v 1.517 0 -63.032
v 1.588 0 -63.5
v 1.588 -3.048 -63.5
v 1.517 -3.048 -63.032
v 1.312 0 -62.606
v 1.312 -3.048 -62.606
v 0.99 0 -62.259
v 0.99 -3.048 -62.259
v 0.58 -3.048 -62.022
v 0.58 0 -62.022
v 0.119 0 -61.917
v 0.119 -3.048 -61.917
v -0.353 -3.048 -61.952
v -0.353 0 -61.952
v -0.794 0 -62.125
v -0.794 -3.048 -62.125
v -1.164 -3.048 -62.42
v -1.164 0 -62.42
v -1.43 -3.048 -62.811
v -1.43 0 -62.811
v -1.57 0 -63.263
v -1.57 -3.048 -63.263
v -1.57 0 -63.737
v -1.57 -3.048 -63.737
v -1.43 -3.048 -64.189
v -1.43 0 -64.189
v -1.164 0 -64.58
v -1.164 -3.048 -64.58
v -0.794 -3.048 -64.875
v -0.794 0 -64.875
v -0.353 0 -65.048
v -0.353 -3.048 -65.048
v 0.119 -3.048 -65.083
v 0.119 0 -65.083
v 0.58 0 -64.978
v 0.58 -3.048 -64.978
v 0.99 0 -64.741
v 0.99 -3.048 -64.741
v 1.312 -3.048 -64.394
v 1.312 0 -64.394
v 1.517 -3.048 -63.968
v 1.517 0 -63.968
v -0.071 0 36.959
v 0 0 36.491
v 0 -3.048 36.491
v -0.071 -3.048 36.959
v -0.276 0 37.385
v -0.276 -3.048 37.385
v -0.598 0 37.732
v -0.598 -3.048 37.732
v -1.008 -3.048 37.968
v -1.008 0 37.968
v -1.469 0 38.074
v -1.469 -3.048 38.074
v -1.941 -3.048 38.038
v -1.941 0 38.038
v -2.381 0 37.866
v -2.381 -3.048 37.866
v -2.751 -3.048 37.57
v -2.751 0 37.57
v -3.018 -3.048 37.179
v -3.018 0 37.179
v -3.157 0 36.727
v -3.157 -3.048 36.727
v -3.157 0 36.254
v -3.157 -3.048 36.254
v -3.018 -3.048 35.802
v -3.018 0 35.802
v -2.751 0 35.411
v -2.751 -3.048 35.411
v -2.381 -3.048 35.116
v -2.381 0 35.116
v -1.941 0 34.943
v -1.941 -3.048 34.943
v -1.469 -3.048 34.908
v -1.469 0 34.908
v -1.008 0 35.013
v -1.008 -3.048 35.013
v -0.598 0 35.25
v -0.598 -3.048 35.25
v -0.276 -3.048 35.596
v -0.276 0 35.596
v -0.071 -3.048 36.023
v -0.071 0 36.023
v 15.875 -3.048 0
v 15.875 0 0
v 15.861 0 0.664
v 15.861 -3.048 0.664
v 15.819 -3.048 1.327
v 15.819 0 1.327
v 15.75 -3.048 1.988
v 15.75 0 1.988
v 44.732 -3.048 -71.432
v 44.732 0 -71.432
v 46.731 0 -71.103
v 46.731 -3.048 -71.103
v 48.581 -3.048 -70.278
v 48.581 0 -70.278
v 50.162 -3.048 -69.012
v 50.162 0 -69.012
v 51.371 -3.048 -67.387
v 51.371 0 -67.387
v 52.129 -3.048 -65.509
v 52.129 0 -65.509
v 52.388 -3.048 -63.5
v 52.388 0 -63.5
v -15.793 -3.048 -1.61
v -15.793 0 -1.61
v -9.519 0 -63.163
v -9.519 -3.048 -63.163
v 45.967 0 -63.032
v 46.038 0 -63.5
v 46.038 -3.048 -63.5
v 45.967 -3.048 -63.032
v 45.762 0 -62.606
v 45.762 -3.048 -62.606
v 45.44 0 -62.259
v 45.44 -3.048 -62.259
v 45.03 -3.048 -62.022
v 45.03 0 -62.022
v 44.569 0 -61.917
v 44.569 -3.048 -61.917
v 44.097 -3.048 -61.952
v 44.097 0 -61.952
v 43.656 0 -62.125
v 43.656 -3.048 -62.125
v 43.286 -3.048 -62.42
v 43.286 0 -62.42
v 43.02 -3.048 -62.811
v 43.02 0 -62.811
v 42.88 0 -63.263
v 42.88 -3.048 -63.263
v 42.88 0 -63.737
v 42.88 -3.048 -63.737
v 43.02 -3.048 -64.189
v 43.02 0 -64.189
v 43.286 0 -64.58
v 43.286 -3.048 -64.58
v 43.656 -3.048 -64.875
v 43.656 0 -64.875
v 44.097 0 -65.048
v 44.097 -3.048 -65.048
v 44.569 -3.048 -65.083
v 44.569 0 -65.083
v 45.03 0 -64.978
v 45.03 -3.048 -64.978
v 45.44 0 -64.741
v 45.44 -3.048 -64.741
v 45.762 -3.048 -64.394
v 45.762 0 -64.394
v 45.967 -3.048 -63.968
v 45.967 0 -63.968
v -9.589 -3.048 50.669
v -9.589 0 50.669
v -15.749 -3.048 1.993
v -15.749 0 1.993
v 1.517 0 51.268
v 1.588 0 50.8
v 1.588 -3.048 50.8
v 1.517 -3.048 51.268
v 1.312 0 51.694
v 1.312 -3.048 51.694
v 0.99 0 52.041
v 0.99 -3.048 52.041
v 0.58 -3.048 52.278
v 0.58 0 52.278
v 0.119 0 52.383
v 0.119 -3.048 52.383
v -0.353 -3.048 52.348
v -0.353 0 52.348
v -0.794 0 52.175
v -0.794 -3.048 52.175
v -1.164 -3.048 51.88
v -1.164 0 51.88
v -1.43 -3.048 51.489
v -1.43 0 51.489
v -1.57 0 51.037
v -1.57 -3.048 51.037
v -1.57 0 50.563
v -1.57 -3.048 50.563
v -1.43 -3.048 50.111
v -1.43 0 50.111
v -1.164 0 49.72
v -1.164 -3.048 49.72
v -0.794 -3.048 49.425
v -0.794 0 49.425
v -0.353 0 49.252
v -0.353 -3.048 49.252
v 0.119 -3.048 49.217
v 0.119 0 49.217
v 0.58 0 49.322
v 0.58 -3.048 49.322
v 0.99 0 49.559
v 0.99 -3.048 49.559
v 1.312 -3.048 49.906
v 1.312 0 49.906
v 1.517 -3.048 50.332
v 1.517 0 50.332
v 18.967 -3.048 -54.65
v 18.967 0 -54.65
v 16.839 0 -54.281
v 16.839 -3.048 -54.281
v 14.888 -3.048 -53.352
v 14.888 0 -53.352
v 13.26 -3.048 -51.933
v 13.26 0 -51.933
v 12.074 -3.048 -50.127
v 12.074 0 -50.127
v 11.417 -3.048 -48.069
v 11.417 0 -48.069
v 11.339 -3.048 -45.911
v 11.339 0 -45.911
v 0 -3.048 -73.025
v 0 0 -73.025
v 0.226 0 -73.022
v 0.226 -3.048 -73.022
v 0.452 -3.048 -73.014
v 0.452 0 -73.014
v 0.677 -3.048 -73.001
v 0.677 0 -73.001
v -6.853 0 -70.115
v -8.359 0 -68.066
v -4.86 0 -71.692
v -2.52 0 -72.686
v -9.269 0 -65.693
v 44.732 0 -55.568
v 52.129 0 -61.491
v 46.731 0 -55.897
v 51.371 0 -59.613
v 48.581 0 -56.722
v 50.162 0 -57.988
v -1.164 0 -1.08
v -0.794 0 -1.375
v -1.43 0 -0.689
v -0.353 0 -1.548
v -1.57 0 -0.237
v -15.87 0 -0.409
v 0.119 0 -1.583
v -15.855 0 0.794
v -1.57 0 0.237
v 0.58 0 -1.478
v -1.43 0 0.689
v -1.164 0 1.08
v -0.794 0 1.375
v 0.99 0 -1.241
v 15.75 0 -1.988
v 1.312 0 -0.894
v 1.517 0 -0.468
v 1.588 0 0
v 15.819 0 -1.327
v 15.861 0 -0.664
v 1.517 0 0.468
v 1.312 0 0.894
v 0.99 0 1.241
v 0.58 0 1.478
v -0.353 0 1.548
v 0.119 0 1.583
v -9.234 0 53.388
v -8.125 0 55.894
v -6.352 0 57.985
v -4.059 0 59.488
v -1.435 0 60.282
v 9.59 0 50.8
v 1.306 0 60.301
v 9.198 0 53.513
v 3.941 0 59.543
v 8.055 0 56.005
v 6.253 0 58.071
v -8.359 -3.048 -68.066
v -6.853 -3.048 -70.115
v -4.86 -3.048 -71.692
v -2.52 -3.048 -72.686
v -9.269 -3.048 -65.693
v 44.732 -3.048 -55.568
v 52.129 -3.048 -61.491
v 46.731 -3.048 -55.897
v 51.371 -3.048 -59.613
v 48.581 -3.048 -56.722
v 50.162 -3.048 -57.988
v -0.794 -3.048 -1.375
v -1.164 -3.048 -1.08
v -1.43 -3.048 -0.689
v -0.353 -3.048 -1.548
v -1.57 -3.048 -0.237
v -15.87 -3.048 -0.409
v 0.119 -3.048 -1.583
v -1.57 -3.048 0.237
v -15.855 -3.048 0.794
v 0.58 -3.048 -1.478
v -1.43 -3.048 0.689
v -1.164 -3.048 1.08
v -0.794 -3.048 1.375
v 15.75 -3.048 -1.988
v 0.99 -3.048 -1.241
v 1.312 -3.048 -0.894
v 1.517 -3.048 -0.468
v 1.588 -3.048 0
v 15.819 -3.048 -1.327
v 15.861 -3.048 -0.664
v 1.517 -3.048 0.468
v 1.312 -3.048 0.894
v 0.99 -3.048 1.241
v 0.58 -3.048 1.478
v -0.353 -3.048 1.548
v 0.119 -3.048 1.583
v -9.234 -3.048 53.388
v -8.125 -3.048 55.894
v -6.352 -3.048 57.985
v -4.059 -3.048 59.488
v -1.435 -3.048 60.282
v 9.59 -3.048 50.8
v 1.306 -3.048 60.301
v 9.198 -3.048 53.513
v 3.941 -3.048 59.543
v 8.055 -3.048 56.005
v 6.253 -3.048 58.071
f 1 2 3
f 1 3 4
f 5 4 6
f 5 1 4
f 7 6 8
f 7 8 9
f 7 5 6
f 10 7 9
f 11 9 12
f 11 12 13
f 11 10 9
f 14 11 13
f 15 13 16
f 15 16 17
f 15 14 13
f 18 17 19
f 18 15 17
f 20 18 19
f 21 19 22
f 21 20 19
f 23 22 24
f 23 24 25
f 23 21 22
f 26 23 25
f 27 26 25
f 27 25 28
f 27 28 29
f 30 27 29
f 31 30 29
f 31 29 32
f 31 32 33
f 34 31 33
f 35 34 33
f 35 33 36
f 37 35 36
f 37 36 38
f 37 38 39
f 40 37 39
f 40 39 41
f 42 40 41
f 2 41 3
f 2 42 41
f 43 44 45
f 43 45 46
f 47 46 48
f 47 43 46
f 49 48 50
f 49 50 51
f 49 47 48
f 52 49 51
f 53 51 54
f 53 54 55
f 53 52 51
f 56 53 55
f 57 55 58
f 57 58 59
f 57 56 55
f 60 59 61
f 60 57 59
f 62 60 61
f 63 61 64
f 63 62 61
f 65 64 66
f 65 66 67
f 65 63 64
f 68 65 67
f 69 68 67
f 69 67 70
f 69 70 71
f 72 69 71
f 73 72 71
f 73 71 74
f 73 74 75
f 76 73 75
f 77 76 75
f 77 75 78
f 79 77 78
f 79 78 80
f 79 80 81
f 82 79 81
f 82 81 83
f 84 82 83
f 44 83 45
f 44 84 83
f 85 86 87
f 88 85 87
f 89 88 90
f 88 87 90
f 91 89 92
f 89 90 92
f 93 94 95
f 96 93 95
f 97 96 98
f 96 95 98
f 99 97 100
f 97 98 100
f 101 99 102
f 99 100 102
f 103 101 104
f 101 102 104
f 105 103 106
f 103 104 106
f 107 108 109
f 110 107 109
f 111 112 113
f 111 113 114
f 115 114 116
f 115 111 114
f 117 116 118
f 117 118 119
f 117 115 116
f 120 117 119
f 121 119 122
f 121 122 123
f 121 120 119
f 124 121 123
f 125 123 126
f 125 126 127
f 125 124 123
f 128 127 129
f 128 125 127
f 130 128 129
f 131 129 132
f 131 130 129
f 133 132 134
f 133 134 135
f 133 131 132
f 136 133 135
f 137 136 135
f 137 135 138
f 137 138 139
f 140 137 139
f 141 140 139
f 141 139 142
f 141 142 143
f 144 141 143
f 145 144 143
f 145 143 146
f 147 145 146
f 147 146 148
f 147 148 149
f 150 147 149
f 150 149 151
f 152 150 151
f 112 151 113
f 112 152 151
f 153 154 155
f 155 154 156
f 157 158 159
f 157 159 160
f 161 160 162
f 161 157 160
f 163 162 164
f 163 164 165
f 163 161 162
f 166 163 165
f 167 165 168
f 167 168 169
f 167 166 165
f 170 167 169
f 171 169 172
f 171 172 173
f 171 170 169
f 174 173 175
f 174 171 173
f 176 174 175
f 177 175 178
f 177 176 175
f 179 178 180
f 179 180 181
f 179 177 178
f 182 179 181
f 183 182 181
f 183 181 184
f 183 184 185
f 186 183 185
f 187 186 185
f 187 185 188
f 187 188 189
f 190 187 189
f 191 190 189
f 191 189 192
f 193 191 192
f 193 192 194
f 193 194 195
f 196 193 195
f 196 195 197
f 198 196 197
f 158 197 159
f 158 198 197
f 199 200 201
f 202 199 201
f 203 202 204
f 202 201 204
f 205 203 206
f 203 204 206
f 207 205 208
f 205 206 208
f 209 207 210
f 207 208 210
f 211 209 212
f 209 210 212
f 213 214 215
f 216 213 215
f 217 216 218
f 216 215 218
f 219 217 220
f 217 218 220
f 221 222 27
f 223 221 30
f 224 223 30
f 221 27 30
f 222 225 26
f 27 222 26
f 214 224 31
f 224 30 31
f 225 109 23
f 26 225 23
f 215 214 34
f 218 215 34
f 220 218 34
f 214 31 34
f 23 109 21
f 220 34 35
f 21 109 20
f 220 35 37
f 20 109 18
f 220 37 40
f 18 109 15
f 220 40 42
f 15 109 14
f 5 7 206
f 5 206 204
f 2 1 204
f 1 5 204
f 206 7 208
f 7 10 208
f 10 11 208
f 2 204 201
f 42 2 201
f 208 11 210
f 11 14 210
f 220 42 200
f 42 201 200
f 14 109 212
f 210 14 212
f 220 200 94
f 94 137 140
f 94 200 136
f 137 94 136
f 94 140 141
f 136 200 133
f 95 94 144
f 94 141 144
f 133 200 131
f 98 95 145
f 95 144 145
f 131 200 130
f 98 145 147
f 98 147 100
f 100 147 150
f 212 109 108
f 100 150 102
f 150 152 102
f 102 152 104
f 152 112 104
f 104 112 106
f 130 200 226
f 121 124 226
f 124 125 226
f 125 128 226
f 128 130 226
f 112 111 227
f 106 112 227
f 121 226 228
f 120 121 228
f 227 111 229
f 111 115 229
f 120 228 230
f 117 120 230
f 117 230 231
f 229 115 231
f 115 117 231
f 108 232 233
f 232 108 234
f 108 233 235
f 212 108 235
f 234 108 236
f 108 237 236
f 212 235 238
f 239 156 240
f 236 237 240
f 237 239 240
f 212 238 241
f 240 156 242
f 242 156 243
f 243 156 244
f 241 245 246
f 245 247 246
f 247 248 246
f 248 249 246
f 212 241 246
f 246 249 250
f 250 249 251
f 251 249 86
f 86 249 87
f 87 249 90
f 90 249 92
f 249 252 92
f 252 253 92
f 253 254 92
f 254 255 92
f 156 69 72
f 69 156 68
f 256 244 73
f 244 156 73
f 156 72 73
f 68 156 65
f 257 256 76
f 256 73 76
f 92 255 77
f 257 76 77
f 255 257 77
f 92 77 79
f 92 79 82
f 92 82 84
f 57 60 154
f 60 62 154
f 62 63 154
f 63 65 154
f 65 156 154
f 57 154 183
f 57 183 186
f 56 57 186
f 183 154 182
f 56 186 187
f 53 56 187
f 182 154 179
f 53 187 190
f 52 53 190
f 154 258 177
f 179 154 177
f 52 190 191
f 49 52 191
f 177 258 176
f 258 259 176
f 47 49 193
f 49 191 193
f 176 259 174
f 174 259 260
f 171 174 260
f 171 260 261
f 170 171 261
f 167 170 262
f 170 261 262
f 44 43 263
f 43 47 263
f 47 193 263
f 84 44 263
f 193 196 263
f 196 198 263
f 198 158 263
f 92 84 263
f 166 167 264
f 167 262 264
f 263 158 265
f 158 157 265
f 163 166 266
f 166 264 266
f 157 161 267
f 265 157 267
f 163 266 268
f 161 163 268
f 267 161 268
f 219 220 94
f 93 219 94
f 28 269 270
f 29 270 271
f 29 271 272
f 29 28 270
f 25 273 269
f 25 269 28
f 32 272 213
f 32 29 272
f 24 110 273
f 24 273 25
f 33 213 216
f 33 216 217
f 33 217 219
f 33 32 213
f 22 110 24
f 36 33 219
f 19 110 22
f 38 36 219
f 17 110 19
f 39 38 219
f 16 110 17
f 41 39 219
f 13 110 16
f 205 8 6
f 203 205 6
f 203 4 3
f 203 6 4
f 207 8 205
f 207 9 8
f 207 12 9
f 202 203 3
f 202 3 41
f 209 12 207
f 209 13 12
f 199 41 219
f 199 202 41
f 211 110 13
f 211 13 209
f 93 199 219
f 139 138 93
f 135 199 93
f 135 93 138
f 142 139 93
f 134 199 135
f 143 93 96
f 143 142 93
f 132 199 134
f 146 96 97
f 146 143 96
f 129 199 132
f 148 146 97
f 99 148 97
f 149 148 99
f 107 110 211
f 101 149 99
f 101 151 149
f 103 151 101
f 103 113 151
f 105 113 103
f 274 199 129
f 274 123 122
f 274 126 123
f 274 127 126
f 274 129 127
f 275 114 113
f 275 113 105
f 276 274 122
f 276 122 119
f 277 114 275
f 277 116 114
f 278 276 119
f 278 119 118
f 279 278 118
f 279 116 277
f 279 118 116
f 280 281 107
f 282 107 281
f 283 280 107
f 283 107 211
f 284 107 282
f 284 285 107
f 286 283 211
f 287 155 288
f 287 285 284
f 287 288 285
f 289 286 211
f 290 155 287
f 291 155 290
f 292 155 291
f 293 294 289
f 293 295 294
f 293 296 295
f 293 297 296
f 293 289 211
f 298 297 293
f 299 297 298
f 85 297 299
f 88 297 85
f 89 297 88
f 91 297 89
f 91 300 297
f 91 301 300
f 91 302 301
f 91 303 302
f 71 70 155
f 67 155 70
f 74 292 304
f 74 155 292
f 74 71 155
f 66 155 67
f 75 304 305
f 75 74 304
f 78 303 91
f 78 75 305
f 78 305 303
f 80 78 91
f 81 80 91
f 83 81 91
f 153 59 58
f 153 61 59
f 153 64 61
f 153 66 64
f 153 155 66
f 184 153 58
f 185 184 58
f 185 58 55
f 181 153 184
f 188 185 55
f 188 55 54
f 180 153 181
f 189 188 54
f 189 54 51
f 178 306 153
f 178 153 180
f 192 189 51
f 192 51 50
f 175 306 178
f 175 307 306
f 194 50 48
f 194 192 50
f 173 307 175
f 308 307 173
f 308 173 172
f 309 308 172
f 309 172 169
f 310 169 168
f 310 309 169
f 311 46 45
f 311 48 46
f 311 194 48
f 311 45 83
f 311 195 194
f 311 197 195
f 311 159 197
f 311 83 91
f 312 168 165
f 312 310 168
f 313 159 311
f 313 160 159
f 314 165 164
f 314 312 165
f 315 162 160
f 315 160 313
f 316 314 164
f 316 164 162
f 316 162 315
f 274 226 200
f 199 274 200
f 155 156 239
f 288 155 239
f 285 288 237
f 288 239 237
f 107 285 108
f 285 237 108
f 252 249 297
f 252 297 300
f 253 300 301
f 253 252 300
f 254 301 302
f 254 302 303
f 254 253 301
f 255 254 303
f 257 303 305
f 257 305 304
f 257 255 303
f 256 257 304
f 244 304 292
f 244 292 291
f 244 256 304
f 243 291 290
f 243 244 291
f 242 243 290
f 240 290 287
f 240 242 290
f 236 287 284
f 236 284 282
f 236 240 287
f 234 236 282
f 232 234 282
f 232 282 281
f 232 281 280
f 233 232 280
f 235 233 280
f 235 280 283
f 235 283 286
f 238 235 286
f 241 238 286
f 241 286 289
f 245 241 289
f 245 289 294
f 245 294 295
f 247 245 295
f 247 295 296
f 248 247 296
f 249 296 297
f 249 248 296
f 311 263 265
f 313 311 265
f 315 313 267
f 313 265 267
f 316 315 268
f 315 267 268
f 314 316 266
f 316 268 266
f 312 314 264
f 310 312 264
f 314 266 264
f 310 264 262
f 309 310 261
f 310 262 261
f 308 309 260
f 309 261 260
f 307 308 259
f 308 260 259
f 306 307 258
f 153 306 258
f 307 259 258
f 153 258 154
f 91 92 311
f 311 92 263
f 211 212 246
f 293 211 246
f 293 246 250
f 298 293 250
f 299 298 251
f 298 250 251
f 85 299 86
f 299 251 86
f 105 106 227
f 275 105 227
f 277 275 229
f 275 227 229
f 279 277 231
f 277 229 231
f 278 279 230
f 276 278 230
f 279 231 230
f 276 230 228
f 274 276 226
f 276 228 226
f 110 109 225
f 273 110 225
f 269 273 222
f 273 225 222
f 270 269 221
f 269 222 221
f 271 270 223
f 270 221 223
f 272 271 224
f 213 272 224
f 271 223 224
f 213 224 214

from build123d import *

# Parameters (mm, degrees)
F0_R     = 1.5875
F1_DEPTH = 3.048


with BuildPart() as f1:
    # F0 (on Front) → F1 (new body)
    with BuildSketch(Plane.XZ):
        with BuildLine():
            ThreePointArc((15.750073, -1.987672), (15.843737, -0.995797), (15.875, 0))
            ThreePointArc((15.875, 0), (15.843737, 0.995797), (15.750073, 1.987672))
            ThreePointArc((15.750073, 1.987672), (0.002791, 15.875), (-15.749373, 1.99321))
            ThreePointArc((-15.749373, 1.99321), (-15.873827, 0.192943), (-15.793167, -1.609816))
            ThreePointArc((-15.793167, -1.609816), (-0.190153, -15.873861), (15.750073, -1.987672))
        make_face()
        Circle(F0_R, mode=Mode.SUBTRACT)
        with BuildLine():
            ThreePointArc((-15.749373, 1.99321), (0.002791, 15.875), (15.750073, 1.987672))
            Line((15.750073, 1.987672), (9.589916, 50.8))
            ThreePointArc((9.589916, 50.8), (0.065367, 41.210307), (-9.589025, 50.66927))
            Line((-9.589025, 50.66927), (-15.749373, 1.99321))
        make_face()
        with Locations((-1.5875, 36.490685)):
            Circle(F0_R, mode=Mode.SUBTRACT)
        with BuildLine():
            Line((11.339253, -45.910697), (15.750073, -1.987672))
            ThreePointArc((15.750073, -1.987672), (-0.190153, -15.873861), (-15.793167, -1.609816))
            Line((-15.793167, -1.609816), (-9.519021, -63.16257))
            ThreePointArc((-9.519021, -63.16257), (0.168741, -53.976495), (9.525, -63.5))
            ThreePointArc((9.525, -63.5), (6.970557, -69.991299), (0.677344, -73.000886))
            Line((0.677344, -73.000886), (44.732405, -71.432475))
            ThreePointArc((44.732405, -71.432475), (36.5125, -63.5), (44.732405, -55.567525))
            Line((44.732405, -55.567525), (18.966809, -54.65024))
            ThreePointArc((18.966809, -54.65024), (13.259898, -51.932727), (11.339253, -45.910697))
        make_face()
        with BuildLine():
            ThreePointArc((-9.589025, 50.66927), (0.065367, 41.210307), (9.589916, 50.8))
            ThreePointArc((9.589916, 50.8), (-0.065367, 60.389693), (-9.589025, 50.66927))
        make_face()
        with Locations((0, 50.8)):
            Circle(F0_R, mode=Mode.SUBTRACT)
        with BuildLine():
            ThreePointArc((9.525, -63.5), (0.168741, -53.976495), (-9.519021, -63.16257))
            ThreePointArc((-9.519021, -63.16257), (-6.853453, -70.114817), (0, -73.025))
            Line((0, -73.025), (0.677344, -73.000886))
            ThreePointArc((0.677344, -73.000886), (6.970557, -69.991299), (9.525, -63.5))
        make_face()
        with Locations((0, -63.5)):
            Circle(F0_R, mode=Mode.SUBTRACT)
        with BuildLine():
            Line((0.677344, -73.000886), (0, -73.025))
            ThreePointArc((0, -73.025), (0.338886, -73.01897), (0.677344, -73.000886))
        make_face()
        with BuildLine():
            ThreePointArc((52.3875, -63.5), (50.161633, -57.98809), (44.732405, -55.567525))
            ThreePointArc((44.732405, -55.567525), (36.5125, -63.5), (44.732405, -71.432475))
            ThreePointArc((44.732405, -71.432475), (50.161633, -69.01191), (52.3875, -63.5))
        make_face()
        with Locations((44.45, -63.5)):
            Circle(F0_R, mode=Mode.SUBTRACT)
    extrude(amount=F1_DEPTH)


solid = f1.part
